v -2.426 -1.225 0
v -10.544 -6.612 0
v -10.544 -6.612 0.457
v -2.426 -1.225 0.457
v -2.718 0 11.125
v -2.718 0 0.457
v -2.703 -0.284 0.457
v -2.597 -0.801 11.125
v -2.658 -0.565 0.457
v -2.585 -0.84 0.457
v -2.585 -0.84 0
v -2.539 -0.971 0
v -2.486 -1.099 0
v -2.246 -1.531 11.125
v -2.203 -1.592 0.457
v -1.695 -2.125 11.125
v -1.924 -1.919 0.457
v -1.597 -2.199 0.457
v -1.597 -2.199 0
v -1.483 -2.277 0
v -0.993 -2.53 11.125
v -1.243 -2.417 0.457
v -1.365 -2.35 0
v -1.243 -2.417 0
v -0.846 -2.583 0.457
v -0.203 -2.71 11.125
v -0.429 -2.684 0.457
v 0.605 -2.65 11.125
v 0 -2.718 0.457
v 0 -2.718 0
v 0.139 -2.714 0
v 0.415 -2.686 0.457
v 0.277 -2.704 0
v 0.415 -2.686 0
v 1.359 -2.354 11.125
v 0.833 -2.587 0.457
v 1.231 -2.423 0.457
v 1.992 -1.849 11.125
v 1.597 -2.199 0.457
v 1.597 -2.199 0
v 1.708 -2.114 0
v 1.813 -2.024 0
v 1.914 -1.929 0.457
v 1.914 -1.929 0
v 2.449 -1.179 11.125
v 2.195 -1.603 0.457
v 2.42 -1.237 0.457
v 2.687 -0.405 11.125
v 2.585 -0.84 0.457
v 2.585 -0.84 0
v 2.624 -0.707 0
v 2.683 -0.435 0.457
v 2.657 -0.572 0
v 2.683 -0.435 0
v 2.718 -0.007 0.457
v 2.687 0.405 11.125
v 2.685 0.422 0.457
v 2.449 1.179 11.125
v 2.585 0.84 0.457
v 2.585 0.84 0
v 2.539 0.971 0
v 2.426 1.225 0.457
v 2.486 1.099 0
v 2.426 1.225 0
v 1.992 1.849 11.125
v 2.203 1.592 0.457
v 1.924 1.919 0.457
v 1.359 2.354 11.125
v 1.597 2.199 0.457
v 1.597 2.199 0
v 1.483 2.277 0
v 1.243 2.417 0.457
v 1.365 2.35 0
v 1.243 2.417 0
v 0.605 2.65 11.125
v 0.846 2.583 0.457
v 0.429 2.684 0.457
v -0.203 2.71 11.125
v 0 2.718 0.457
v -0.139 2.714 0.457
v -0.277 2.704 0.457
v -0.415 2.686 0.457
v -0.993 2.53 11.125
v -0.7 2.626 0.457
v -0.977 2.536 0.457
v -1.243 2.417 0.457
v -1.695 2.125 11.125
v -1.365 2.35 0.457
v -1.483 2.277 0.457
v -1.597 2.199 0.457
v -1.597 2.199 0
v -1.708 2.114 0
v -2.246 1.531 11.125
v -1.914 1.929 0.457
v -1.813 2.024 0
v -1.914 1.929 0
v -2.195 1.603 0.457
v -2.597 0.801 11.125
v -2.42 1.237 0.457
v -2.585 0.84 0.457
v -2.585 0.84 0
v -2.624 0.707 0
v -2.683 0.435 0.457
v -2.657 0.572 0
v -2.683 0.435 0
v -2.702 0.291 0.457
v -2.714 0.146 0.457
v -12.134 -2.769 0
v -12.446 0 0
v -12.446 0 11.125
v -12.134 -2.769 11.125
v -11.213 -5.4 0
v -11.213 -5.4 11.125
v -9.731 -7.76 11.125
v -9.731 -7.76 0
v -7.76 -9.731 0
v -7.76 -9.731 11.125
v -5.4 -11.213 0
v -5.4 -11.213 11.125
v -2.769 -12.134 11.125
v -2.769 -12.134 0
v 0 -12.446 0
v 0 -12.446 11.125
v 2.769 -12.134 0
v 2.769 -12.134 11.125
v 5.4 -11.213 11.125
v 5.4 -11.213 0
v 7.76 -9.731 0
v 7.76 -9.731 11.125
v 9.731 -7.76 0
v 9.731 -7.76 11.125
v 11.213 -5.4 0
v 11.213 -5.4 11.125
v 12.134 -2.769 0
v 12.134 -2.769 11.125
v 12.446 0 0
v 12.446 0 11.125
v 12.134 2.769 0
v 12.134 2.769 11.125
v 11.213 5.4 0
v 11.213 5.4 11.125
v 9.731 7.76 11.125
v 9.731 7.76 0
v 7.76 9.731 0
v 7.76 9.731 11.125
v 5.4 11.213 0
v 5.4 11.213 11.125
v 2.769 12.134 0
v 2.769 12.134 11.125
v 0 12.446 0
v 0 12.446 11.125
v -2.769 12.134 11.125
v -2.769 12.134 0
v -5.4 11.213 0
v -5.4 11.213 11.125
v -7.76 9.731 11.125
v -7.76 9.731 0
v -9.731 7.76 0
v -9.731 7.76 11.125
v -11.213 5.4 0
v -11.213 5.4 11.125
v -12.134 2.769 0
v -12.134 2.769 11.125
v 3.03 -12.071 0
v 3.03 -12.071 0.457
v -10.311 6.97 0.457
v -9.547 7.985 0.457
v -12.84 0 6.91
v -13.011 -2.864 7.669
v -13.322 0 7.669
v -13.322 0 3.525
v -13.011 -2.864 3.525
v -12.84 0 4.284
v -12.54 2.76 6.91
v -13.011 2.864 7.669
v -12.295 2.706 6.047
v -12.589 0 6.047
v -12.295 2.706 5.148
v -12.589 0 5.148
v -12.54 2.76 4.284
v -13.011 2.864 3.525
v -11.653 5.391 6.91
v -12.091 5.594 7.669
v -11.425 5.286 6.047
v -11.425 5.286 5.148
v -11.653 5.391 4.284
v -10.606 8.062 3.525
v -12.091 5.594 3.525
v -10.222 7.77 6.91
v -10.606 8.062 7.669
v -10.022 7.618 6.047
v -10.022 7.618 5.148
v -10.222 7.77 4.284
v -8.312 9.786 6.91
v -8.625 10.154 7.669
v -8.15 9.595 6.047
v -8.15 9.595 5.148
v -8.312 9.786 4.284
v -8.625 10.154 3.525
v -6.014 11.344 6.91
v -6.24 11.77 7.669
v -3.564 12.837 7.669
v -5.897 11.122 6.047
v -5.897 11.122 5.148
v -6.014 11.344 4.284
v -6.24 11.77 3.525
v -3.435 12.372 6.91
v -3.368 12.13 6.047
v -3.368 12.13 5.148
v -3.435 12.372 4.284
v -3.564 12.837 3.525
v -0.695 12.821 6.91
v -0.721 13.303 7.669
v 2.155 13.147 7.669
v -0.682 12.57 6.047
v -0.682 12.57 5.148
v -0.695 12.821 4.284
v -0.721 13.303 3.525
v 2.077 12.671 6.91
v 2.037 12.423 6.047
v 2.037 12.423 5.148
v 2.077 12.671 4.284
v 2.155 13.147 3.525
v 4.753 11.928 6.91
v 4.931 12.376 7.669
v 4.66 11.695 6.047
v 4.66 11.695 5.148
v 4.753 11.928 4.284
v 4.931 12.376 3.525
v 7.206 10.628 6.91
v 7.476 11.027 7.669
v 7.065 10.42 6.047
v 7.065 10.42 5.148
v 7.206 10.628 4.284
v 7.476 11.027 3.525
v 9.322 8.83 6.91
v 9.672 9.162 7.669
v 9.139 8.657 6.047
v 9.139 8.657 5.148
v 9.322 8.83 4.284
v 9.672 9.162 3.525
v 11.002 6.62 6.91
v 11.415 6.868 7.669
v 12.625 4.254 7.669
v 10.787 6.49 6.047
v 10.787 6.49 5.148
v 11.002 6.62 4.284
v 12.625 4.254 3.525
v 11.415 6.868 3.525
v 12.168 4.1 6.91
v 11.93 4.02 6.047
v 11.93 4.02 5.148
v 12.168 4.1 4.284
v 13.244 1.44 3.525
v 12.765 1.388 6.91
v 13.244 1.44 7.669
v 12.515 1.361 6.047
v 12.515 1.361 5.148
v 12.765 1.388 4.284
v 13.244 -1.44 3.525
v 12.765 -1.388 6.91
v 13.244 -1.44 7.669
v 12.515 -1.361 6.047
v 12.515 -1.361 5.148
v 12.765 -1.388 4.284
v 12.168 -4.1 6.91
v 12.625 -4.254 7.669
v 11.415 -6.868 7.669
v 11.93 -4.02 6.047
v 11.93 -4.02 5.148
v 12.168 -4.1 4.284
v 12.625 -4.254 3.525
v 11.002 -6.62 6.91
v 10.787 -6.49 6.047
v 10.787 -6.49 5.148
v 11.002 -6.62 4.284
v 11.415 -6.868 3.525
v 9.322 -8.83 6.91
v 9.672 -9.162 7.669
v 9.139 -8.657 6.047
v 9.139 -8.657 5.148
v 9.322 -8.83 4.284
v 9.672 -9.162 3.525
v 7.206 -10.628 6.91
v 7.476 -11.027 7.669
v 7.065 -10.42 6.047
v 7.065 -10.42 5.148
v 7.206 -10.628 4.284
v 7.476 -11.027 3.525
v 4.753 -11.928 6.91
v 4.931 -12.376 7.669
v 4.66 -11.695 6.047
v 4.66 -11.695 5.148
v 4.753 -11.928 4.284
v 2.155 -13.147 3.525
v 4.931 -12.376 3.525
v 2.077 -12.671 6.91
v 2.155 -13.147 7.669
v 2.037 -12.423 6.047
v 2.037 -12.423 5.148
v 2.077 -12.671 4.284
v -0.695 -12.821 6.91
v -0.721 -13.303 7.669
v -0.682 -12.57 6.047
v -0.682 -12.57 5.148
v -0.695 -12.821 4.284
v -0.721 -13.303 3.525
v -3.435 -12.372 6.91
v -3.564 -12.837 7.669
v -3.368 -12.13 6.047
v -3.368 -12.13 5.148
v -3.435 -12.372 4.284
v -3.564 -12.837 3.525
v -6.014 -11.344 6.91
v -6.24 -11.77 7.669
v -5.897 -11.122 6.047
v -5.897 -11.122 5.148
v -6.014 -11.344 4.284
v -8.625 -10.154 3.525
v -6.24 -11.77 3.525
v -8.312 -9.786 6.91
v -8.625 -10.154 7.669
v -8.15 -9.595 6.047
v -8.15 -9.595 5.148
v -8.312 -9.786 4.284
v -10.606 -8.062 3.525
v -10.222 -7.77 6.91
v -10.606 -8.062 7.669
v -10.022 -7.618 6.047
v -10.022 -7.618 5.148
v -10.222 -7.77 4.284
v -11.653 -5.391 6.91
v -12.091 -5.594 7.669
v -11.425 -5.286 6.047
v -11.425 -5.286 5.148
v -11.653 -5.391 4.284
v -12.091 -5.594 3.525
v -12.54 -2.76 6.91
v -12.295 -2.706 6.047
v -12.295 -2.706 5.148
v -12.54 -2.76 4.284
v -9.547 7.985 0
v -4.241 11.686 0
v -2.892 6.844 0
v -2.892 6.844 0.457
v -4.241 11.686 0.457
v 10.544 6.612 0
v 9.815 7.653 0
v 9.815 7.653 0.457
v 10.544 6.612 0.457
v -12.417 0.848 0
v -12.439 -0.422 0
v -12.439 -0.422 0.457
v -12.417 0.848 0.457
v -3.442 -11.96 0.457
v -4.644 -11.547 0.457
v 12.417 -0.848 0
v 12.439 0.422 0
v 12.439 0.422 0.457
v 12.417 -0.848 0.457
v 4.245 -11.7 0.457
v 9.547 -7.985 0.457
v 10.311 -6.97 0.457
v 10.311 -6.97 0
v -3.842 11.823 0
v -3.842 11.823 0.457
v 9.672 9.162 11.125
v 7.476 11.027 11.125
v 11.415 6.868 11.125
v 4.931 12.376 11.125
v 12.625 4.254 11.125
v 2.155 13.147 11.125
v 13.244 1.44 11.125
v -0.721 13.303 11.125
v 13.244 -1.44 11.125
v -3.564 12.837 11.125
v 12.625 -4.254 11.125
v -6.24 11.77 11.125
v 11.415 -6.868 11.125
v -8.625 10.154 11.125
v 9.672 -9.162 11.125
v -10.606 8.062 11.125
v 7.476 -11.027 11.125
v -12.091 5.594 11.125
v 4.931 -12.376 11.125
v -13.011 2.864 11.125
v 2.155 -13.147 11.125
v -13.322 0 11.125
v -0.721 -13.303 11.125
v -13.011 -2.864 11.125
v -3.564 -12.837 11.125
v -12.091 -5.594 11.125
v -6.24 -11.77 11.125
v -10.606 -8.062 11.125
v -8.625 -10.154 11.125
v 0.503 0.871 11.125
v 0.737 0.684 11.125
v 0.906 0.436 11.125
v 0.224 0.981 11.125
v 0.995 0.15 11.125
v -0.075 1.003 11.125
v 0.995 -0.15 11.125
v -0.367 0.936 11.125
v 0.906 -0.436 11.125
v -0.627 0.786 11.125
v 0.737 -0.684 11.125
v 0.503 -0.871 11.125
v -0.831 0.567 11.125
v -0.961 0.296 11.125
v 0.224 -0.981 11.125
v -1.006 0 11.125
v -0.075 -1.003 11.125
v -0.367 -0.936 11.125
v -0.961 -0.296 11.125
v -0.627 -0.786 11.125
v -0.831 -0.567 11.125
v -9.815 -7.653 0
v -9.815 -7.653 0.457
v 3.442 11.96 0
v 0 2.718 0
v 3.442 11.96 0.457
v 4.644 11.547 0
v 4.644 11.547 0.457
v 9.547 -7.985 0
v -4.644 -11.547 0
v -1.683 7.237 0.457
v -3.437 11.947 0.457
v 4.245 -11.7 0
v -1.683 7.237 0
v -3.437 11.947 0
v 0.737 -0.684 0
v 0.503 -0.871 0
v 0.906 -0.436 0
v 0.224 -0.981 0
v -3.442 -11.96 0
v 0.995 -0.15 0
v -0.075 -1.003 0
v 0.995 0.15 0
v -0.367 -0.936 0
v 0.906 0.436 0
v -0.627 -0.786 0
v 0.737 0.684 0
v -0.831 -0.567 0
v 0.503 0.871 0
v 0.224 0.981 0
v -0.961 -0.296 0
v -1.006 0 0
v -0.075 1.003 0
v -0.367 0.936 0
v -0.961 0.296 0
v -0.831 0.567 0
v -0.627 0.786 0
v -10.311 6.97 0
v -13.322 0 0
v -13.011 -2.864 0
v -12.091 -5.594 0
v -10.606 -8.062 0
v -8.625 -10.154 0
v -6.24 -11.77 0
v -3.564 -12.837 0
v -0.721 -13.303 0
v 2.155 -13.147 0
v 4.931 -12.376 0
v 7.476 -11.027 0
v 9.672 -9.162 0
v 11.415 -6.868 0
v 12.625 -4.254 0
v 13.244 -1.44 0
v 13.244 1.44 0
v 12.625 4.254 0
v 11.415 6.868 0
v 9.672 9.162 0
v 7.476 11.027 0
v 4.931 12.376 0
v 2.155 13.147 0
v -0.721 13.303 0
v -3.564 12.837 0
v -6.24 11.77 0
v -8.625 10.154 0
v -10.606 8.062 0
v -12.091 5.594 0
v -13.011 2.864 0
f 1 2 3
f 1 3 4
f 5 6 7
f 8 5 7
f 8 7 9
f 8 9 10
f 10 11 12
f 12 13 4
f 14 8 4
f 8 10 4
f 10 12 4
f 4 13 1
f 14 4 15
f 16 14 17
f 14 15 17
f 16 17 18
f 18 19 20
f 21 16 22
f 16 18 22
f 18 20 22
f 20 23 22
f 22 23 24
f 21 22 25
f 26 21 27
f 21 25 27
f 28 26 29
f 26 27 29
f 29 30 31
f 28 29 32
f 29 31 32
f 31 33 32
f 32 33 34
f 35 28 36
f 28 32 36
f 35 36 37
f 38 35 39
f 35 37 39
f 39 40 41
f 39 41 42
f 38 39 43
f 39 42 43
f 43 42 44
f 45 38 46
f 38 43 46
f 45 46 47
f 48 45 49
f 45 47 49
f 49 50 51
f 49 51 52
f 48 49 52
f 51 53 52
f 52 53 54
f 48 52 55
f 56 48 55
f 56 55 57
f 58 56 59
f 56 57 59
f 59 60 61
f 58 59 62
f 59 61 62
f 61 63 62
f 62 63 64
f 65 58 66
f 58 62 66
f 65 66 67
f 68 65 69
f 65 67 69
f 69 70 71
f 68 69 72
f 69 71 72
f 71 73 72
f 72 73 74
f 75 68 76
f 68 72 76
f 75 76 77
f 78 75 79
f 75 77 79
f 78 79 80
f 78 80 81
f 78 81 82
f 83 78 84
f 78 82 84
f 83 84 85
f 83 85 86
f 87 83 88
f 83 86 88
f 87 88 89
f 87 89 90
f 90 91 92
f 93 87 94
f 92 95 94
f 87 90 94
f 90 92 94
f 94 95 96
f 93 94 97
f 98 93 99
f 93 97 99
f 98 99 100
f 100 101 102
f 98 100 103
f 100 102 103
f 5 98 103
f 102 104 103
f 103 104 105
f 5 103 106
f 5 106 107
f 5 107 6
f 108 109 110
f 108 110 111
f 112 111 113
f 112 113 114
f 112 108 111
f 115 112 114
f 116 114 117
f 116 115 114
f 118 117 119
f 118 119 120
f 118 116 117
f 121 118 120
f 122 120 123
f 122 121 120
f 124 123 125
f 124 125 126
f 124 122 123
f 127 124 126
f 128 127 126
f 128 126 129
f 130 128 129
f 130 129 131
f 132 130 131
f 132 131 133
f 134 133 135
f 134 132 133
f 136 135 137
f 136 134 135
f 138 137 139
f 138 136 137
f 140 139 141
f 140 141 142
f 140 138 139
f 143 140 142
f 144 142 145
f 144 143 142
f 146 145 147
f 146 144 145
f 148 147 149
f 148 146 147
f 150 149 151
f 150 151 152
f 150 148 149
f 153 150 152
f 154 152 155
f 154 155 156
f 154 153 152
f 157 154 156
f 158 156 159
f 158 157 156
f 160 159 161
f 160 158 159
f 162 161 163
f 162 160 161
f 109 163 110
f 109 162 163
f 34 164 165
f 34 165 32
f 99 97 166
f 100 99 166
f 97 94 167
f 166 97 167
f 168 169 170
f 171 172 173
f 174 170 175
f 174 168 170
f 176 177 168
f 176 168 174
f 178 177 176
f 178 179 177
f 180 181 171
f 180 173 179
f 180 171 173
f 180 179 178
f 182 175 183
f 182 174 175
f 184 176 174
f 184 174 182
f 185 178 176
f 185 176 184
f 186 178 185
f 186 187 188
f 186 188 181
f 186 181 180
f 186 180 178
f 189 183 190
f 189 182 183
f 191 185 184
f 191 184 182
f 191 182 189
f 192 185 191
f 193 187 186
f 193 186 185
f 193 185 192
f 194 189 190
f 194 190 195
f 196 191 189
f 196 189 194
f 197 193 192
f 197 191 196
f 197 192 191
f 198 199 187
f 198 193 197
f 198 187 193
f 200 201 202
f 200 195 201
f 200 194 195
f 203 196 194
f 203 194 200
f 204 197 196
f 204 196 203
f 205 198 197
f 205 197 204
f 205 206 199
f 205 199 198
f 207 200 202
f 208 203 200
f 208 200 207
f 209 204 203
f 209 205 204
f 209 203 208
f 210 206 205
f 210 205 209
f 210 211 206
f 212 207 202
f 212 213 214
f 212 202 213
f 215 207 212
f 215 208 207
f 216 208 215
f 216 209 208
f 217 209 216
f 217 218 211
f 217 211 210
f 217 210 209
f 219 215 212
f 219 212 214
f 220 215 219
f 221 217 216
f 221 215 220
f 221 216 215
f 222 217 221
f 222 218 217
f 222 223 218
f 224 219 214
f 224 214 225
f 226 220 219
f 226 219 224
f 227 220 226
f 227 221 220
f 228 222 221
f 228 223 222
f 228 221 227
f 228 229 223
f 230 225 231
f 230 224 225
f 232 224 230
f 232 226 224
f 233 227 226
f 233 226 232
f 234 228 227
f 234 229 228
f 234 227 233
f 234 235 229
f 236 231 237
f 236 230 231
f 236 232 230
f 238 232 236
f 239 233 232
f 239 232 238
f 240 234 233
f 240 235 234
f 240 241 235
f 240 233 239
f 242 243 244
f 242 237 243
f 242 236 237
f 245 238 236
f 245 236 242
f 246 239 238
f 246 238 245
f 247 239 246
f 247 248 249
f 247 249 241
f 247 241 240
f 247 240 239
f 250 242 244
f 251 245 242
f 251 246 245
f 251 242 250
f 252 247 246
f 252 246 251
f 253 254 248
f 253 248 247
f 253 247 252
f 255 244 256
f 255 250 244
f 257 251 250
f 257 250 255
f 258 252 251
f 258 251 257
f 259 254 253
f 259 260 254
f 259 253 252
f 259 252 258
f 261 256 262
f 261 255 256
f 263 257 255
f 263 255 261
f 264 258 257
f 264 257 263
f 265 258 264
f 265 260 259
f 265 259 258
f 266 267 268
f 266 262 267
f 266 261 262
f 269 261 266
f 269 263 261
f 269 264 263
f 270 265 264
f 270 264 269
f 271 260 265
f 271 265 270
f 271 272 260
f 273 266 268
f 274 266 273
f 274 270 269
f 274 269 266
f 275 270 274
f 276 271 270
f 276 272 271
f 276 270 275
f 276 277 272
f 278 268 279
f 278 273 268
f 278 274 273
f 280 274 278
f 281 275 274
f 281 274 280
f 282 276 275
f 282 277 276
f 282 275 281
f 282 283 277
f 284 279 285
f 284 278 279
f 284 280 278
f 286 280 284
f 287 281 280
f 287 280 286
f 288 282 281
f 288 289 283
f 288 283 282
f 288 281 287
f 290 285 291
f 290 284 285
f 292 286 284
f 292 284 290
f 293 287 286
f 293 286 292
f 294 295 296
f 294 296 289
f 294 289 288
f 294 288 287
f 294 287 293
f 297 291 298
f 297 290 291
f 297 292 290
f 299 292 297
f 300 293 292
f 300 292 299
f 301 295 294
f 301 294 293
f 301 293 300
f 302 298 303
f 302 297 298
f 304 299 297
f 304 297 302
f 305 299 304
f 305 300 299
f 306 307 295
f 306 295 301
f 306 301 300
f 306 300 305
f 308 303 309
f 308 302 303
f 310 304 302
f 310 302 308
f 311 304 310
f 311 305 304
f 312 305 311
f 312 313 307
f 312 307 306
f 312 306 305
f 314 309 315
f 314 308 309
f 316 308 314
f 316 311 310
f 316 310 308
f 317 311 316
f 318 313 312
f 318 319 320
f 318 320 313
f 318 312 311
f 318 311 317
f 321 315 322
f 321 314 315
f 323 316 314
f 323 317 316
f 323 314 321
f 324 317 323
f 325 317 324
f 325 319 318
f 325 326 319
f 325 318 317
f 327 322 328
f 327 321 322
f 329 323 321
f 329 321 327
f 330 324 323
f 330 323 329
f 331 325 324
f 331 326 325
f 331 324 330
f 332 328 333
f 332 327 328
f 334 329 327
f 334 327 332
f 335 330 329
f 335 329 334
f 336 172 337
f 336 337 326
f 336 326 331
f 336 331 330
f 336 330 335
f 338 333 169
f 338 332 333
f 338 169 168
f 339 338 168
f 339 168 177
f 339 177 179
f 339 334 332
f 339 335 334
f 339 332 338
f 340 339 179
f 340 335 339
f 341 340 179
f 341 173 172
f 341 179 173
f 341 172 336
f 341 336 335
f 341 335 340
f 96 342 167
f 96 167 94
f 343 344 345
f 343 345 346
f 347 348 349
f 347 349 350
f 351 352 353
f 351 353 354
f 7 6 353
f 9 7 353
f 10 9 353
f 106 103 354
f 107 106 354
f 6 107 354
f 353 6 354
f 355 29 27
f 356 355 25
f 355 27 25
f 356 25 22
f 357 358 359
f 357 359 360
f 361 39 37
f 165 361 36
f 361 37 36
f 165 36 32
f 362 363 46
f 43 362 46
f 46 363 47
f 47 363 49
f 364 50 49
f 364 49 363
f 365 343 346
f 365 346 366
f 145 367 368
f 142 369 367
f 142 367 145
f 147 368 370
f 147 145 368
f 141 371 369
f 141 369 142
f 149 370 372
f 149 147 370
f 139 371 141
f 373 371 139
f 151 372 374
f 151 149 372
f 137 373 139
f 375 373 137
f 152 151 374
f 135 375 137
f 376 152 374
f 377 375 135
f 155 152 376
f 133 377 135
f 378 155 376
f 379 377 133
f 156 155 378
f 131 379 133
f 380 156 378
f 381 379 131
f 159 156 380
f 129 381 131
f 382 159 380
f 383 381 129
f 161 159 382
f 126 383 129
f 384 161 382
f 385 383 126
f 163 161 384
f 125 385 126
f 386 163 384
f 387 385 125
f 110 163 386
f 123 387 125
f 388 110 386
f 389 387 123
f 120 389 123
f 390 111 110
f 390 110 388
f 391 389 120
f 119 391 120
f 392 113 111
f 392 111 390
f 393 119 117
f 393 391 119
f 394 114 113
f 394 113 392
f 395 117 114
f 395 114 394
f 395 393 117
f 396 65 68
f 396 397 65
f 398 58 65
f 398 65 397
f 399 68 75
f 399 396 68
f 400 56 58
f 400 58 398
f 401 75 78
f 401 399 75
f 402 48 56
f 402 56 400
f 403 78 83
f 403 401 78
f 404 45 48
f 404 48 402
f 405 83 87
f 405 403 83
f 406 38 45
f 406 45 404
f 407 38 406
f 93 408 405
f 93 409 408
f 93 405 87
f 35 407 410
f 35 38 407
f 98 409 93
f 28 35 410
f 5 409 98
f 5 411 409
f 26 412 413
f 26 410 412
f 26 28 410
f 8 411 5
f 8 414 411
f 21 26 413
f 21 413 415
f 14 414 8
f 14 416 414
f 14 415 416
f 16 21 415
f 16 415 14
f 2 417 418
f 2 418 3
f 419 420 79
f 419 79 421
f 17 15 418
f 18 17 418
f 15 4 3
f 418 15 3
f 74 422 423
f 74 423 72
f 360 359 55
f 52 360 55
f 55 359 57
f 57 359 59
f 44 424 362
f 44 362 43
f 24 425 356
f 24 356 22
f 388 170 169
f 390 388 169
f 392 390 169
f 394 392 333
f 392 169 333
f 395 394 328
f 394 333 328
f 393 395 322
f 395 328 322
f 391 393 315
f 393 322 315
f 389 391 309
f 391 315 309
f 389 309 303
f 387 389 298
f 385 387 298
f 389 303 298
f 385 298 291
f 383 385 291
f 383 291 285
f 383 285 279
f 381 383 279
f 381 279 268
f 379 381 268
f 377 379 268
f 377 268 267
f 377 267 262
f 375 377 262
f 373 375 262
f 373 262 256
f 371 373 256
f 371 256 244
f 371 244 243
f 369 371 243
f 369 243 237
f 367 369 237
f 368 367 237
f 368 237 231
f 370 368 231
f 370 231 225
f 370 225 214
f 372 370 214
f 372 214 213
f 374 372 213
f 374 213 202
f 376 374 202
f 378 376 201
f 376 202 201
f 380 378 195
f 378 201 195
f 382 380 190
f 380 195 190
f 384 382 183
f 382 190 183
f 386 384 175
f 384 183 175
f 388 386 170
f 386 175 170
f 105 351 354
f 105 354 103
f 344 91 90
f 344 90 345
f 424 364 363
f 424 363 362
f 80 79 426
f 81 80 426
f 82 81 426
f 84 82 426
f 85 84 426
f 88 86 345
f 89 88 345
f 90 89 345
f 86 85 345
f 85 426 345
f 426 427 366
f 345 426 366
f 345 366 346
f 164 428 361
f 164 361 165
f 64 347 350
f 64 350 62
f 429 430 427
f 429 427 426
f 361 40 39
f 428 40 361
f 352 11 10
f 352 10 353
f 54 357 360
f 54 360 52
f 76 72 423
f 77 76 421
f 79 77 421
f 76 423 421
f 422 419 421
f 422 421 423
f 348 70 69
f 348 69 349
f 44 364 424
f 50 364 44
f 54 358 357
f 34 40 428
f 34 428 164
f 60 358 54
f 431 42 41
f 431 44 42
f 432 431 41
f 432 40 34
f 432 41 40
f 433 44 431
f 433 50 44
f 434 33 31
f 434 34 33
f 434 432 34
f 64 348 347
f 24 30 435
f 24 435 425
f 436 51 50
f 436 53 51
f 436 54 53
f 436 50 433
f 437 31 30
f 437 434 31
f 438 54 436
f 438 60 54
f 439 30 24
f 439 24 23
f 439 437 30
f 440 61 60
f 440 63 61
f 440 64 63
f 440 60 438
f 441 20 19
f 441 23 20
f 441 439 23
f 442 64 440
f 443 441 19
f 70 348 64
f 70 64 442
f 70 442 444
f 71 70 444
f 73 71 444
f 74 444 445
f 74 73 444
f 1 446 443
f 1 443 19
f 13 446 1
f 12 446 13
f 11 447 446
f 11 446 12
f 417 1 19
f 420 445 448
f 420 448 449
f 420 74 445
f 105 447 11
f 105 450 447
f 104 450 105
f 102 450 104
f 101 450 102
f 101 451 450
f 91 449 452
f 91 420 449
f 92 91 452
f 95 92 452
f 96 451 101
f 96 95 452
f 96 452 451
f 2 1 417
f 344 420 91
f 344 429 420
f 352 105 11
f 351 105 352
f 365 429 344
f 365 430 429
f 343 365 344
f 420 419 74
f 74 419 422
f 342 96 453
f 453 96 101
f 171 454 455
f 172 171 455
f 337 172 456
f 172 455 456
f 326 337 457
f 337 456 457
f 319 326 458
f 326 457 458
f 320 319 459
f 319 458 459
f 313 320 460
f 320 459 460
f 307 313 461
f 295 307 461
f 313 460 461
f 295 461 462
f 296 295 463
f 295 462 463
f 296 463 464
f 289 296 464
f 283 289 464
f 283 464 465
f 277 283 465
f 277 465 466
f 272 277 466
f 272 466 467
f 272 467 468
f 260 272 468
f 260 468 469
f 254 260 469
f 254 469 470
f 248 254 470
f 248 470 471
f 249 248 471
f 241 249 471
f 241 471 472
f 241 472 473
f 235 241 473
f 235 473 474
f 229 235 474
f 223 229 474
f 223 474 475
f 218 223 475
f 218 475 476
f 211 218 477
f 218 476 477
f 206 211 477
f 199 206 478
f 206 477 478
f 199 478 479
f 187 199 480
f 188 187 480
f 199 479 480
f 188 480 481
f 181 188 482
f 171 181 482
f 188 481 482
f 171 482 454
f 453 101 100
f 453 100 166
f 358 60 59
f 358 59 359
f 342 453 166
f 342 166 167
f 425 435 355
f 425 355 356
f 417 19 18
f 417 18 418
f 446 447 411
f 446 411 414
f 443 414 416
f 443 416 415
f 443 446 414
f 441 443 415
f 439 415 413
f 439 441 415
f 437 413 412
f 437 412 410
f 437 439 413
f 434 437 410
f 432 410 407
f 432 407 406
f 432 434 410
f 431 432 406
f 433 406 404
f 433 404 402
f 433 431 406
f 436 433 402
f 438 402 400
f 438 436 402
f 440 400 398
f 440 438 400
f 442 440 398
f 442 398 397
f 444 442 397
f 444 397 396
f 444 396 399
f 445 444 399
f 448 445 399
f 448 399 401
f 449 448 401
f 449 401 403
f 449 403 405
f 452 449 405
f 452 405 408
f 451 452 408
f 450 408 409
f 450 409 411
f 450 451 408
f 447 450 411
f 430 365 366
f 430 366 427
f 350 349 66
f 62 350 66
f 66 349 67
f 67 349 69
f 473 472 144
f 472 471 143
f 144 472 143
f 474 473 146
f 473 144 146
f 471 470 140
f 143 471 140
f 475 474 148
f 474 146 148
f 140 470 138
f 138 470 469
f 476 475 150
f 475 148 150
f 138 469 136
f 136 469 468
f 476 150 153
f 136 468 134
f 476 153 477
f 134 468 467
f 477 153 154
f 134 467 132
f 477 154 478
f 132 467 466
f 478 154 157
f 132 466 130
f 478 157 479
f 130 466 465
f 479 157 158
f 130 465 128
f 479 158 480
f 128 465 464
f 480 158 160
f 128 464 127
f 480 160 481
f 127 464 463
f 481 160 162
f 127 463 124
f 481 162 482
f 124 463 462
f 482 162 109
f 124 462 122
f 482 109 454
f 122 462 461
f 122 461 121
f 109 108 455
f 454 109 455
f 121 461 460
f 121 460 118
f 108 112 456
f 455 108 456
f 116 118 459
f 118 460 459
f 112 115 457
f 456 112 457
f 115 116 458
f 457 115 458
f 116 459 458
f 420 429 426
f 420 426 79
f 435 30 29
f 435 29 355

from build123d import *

# Parameters (mm, degrees)
SKETCH1_R             = 13.3223
SKETCH1_R_2           = 12.446
BOSS_EXTRUDE1_DEPTH   = 11.1252
SKETCH1_R_3           = 2.7178
SKETCH1_R_4           = 1.00584
BOSS_EXTRUDE1_2_DEPTH = 11.1252
BOSS_EXTRUDE2_DEPTH   = 0.4572
SKETCH5_R             = 3.187289882


with BuildPart() as part:
    # Sketch1 → Boss-Extrude1 (new body)
    with BuildSketch(Plane.XY):
        with Locations(Location((0, 0, 0), (0, 0, 180))):
            Circle(SKETCH1_R)
        with Locations(Location((0, 0, 0), (0, 0, 180))):
            Circle(SKETCH1_R_2, mode=Mode.SUBTRACT)
    extrude(amount=BOSS_EXTRUDE1_DEPTH)

    # Sketch5 → Cut-Revolve1 (revolve, cut)
    with BuildSketch(Plane(origin=(0, 0, 0), x_dir=(0, 0, -1), z_dir=(1, 0, 0)), mode=Mode.PRIVATE) as cut_revolve1_sk:
        with Locations((-5.597195997, 15.744244979)):
            Circle(SKETCH5_R)
    revolve(cut_revolve1_sk.sketch.rotate(Axis((0, 0, 11.606286755), (0, 0, -1)), 270), axis=Axis((0, 0, 11.606286755), (0, 0, -1)), mode=Mode.SUBTRACT)


with BuildPart() as body_2:
    # Sketch1 → Boss-Extrude1 2 (new body)
    with BuildSketch(Plane.XY):
        with Locations(Location((0, 0, 0), (0, 0, 180))):
            Circle(SKETCH1_R_3)
        with Locations(Location((0, 0, 0), (0, 0, 180))):
            Circle(SKETCH1_R_4, mode=Mode.SUBTRACT)
    extrude(amount=BOSS_EXTRUDE1_2_DEPTH)

    # Sketch2 → Boss-Extrude2 (add)
    with BuildSketch(Plane(origin=(0, 0, 0), x_dir=(-1, 0, 0), z_dir=(0, 0, -1))):
        with BuildLine():
            Line((0, 2.7178), (-3.442415798, 11.960463598))
            Line((-3.442415798, 11.960463598), (-4.643735623, 11.54723497))
            Line((-4.643735623, 11.54723497), (-1.243130148, 2.416829385))
            ThreePointArc((-1.243130148, 2.416829385), (-0.639522454, 2.641485921), (0, 2.7178))
        make_face()
        with BuildLine():
            ThreePointArc((-2.426290086, 1.224562477), (-2.070011002, 1.761105133), (-1.597482759, 2.198746387))
            Line((-1.597482759, 2.198746387), (-9.815156996, 7.652817073))
            Line((-9.815156996, 7.652817073), (-10.544155457, 6.612390014))
            Line((-10.544155457, 6.612390014), (-2.426290086, 1.224562477))
        make_face()
        with BuildLine():
            ThreePointArc((-2.682689677, -0.435445676), (-2.709825704, 0.208042043), (-2.5847814, 0.839846387))
            Line((-2.5847814, 0.839846387), (-12.438841826, 0.422054536))
            Line((-12.438841826, 0.422054536), (-12.417066289, -0.848163181))
            Line((-12.417066289, -0.848163181), (-2.682689677, -0.435445676))
        make_face()
        with BuildLine():
            ThreePointArc((-1.914392993, -1.929128381), (-2.314579091, -1.424486037), (-2.5847814, -0.839846387))
            Line((-2.5847814, -0.839846387), (-10.311311859, -6.969918489))
            Line((-10.311311859, -6.969918489), (-9.547079839, -7.984746868))
            Line((-9.547079839, -7.984746868), (-1.914392993, -1.929128381))
        make_face()
        with BuildLine():
            ThreePointArc((-0.414863253, -2.685949613), (-1.035241935, -2.512908868), (-1.597482759, -2.198746387))
            Line((-1.597482759, -2.198746387), (-4.245211231, -11.69961955))
            Line((-4.245211231, -11.69961955), (-3.030433384, -12.071428644))
            Line((-3.030433384, -12.071428644), (-0.414863253, -2.685949613))
        make_face()
        with BuildLine():
            Line((10.544155457, -6.612390014), (2.426290086, -1.224562477))
            ThreePointArc((2.426290086, -1.224562477), (2.070011002, -1.761105133), (1.597482759, -2.198746387))
            Line((1.597482759, -2.198746387), (9.815156996, -7.652817073))
            Line((9.815156996, -7.652817073), (10.544155457, -6.612390014))
        make_face()
        with BuildLine():
            Line((12.417066289, 0.848163181), (2.682689677, 0.435445676))
            ThreePointArc((2.682689677, 0.435445676), (2.709008199, 0.218429435), (2.7178, 0))
            ThreePointArc((2.7178, 0), (2.684339372, -0.425157589), (2.5847814, -0.839846387))
            Line((2.5847814, -0.839846387), (12.438841826, -0.422054536))
            Line((12.438841826, -0.422054536), (12.417066289, 0.848163181))
        make_face()
        with BuildLine():
            Line((9.547079839, 7.984746868), (1.914392993, 1.929128381))
            ThreePointArc((1.914392993, 1.929128381), (2.314579091, 1.424486037), (2.5847814, 0.839846387))
            Line((2.5847814, 0.839846387), (10.311311859, 6.969918489))
            Line((10.311311859, 6.969918489), (9.547079839, 7.984746868))
        make_face()
        with BuildLine():
            Line((2.892067949, 6.844120647), (1.243130148, 2.416829385))
            ThreePointArc((1.243130148, 2.416829385), (1.424486037, 2.314579091), (1.597482759, 2.198746387))
            Line((1.597482759, 2.198746387), (2.892067949, 6.844120647))
        make_face()
        with BuildLine():
            Line((3.437356932, 11.946880871), (1.683141062, 7.236924804))
            Line((1.683141062, 7.236924804), (0.414863253, 2.685949613))
            ThreePointArc((0.414863253, 2.685949613), (0.839846387, 2.5847814), (1.243130148, 2.416829385))
            Line((1.243130148, 2.416829385), (2.892067949, 6.844120647))
            Line((2.892067949, 6.844120647), (4.241320213, 11.685657366))
            Line((4.241320213, 11.685657366), (3.84157767, 11.823160351))
            Line((3.84157767, 11.823160351), (3.437356932, 11.946880871))
        make_face()
        with BuildLine():
            Line((1.683141062, 7.236924804), (0, 2.7178))
            ThreePointArc((0, 2.7178), (0.208042043, 2.709825704), (0.414863253, 2.685949613))
            Line((0.414863253, 2.685949613), (1.683141062, 7.236924804))
        make_face()
        Polygon((4.643735623, -11.54723497), (1.243130148, -2.416829385), (0, -2.712359299), (0, -2.7178), (3.442415798, -11.960463598), align=None)
    extrude(amount=-BOSS_EXTRUDE2_DEPTH)


solid = Compound([part.part, body_2.part])
